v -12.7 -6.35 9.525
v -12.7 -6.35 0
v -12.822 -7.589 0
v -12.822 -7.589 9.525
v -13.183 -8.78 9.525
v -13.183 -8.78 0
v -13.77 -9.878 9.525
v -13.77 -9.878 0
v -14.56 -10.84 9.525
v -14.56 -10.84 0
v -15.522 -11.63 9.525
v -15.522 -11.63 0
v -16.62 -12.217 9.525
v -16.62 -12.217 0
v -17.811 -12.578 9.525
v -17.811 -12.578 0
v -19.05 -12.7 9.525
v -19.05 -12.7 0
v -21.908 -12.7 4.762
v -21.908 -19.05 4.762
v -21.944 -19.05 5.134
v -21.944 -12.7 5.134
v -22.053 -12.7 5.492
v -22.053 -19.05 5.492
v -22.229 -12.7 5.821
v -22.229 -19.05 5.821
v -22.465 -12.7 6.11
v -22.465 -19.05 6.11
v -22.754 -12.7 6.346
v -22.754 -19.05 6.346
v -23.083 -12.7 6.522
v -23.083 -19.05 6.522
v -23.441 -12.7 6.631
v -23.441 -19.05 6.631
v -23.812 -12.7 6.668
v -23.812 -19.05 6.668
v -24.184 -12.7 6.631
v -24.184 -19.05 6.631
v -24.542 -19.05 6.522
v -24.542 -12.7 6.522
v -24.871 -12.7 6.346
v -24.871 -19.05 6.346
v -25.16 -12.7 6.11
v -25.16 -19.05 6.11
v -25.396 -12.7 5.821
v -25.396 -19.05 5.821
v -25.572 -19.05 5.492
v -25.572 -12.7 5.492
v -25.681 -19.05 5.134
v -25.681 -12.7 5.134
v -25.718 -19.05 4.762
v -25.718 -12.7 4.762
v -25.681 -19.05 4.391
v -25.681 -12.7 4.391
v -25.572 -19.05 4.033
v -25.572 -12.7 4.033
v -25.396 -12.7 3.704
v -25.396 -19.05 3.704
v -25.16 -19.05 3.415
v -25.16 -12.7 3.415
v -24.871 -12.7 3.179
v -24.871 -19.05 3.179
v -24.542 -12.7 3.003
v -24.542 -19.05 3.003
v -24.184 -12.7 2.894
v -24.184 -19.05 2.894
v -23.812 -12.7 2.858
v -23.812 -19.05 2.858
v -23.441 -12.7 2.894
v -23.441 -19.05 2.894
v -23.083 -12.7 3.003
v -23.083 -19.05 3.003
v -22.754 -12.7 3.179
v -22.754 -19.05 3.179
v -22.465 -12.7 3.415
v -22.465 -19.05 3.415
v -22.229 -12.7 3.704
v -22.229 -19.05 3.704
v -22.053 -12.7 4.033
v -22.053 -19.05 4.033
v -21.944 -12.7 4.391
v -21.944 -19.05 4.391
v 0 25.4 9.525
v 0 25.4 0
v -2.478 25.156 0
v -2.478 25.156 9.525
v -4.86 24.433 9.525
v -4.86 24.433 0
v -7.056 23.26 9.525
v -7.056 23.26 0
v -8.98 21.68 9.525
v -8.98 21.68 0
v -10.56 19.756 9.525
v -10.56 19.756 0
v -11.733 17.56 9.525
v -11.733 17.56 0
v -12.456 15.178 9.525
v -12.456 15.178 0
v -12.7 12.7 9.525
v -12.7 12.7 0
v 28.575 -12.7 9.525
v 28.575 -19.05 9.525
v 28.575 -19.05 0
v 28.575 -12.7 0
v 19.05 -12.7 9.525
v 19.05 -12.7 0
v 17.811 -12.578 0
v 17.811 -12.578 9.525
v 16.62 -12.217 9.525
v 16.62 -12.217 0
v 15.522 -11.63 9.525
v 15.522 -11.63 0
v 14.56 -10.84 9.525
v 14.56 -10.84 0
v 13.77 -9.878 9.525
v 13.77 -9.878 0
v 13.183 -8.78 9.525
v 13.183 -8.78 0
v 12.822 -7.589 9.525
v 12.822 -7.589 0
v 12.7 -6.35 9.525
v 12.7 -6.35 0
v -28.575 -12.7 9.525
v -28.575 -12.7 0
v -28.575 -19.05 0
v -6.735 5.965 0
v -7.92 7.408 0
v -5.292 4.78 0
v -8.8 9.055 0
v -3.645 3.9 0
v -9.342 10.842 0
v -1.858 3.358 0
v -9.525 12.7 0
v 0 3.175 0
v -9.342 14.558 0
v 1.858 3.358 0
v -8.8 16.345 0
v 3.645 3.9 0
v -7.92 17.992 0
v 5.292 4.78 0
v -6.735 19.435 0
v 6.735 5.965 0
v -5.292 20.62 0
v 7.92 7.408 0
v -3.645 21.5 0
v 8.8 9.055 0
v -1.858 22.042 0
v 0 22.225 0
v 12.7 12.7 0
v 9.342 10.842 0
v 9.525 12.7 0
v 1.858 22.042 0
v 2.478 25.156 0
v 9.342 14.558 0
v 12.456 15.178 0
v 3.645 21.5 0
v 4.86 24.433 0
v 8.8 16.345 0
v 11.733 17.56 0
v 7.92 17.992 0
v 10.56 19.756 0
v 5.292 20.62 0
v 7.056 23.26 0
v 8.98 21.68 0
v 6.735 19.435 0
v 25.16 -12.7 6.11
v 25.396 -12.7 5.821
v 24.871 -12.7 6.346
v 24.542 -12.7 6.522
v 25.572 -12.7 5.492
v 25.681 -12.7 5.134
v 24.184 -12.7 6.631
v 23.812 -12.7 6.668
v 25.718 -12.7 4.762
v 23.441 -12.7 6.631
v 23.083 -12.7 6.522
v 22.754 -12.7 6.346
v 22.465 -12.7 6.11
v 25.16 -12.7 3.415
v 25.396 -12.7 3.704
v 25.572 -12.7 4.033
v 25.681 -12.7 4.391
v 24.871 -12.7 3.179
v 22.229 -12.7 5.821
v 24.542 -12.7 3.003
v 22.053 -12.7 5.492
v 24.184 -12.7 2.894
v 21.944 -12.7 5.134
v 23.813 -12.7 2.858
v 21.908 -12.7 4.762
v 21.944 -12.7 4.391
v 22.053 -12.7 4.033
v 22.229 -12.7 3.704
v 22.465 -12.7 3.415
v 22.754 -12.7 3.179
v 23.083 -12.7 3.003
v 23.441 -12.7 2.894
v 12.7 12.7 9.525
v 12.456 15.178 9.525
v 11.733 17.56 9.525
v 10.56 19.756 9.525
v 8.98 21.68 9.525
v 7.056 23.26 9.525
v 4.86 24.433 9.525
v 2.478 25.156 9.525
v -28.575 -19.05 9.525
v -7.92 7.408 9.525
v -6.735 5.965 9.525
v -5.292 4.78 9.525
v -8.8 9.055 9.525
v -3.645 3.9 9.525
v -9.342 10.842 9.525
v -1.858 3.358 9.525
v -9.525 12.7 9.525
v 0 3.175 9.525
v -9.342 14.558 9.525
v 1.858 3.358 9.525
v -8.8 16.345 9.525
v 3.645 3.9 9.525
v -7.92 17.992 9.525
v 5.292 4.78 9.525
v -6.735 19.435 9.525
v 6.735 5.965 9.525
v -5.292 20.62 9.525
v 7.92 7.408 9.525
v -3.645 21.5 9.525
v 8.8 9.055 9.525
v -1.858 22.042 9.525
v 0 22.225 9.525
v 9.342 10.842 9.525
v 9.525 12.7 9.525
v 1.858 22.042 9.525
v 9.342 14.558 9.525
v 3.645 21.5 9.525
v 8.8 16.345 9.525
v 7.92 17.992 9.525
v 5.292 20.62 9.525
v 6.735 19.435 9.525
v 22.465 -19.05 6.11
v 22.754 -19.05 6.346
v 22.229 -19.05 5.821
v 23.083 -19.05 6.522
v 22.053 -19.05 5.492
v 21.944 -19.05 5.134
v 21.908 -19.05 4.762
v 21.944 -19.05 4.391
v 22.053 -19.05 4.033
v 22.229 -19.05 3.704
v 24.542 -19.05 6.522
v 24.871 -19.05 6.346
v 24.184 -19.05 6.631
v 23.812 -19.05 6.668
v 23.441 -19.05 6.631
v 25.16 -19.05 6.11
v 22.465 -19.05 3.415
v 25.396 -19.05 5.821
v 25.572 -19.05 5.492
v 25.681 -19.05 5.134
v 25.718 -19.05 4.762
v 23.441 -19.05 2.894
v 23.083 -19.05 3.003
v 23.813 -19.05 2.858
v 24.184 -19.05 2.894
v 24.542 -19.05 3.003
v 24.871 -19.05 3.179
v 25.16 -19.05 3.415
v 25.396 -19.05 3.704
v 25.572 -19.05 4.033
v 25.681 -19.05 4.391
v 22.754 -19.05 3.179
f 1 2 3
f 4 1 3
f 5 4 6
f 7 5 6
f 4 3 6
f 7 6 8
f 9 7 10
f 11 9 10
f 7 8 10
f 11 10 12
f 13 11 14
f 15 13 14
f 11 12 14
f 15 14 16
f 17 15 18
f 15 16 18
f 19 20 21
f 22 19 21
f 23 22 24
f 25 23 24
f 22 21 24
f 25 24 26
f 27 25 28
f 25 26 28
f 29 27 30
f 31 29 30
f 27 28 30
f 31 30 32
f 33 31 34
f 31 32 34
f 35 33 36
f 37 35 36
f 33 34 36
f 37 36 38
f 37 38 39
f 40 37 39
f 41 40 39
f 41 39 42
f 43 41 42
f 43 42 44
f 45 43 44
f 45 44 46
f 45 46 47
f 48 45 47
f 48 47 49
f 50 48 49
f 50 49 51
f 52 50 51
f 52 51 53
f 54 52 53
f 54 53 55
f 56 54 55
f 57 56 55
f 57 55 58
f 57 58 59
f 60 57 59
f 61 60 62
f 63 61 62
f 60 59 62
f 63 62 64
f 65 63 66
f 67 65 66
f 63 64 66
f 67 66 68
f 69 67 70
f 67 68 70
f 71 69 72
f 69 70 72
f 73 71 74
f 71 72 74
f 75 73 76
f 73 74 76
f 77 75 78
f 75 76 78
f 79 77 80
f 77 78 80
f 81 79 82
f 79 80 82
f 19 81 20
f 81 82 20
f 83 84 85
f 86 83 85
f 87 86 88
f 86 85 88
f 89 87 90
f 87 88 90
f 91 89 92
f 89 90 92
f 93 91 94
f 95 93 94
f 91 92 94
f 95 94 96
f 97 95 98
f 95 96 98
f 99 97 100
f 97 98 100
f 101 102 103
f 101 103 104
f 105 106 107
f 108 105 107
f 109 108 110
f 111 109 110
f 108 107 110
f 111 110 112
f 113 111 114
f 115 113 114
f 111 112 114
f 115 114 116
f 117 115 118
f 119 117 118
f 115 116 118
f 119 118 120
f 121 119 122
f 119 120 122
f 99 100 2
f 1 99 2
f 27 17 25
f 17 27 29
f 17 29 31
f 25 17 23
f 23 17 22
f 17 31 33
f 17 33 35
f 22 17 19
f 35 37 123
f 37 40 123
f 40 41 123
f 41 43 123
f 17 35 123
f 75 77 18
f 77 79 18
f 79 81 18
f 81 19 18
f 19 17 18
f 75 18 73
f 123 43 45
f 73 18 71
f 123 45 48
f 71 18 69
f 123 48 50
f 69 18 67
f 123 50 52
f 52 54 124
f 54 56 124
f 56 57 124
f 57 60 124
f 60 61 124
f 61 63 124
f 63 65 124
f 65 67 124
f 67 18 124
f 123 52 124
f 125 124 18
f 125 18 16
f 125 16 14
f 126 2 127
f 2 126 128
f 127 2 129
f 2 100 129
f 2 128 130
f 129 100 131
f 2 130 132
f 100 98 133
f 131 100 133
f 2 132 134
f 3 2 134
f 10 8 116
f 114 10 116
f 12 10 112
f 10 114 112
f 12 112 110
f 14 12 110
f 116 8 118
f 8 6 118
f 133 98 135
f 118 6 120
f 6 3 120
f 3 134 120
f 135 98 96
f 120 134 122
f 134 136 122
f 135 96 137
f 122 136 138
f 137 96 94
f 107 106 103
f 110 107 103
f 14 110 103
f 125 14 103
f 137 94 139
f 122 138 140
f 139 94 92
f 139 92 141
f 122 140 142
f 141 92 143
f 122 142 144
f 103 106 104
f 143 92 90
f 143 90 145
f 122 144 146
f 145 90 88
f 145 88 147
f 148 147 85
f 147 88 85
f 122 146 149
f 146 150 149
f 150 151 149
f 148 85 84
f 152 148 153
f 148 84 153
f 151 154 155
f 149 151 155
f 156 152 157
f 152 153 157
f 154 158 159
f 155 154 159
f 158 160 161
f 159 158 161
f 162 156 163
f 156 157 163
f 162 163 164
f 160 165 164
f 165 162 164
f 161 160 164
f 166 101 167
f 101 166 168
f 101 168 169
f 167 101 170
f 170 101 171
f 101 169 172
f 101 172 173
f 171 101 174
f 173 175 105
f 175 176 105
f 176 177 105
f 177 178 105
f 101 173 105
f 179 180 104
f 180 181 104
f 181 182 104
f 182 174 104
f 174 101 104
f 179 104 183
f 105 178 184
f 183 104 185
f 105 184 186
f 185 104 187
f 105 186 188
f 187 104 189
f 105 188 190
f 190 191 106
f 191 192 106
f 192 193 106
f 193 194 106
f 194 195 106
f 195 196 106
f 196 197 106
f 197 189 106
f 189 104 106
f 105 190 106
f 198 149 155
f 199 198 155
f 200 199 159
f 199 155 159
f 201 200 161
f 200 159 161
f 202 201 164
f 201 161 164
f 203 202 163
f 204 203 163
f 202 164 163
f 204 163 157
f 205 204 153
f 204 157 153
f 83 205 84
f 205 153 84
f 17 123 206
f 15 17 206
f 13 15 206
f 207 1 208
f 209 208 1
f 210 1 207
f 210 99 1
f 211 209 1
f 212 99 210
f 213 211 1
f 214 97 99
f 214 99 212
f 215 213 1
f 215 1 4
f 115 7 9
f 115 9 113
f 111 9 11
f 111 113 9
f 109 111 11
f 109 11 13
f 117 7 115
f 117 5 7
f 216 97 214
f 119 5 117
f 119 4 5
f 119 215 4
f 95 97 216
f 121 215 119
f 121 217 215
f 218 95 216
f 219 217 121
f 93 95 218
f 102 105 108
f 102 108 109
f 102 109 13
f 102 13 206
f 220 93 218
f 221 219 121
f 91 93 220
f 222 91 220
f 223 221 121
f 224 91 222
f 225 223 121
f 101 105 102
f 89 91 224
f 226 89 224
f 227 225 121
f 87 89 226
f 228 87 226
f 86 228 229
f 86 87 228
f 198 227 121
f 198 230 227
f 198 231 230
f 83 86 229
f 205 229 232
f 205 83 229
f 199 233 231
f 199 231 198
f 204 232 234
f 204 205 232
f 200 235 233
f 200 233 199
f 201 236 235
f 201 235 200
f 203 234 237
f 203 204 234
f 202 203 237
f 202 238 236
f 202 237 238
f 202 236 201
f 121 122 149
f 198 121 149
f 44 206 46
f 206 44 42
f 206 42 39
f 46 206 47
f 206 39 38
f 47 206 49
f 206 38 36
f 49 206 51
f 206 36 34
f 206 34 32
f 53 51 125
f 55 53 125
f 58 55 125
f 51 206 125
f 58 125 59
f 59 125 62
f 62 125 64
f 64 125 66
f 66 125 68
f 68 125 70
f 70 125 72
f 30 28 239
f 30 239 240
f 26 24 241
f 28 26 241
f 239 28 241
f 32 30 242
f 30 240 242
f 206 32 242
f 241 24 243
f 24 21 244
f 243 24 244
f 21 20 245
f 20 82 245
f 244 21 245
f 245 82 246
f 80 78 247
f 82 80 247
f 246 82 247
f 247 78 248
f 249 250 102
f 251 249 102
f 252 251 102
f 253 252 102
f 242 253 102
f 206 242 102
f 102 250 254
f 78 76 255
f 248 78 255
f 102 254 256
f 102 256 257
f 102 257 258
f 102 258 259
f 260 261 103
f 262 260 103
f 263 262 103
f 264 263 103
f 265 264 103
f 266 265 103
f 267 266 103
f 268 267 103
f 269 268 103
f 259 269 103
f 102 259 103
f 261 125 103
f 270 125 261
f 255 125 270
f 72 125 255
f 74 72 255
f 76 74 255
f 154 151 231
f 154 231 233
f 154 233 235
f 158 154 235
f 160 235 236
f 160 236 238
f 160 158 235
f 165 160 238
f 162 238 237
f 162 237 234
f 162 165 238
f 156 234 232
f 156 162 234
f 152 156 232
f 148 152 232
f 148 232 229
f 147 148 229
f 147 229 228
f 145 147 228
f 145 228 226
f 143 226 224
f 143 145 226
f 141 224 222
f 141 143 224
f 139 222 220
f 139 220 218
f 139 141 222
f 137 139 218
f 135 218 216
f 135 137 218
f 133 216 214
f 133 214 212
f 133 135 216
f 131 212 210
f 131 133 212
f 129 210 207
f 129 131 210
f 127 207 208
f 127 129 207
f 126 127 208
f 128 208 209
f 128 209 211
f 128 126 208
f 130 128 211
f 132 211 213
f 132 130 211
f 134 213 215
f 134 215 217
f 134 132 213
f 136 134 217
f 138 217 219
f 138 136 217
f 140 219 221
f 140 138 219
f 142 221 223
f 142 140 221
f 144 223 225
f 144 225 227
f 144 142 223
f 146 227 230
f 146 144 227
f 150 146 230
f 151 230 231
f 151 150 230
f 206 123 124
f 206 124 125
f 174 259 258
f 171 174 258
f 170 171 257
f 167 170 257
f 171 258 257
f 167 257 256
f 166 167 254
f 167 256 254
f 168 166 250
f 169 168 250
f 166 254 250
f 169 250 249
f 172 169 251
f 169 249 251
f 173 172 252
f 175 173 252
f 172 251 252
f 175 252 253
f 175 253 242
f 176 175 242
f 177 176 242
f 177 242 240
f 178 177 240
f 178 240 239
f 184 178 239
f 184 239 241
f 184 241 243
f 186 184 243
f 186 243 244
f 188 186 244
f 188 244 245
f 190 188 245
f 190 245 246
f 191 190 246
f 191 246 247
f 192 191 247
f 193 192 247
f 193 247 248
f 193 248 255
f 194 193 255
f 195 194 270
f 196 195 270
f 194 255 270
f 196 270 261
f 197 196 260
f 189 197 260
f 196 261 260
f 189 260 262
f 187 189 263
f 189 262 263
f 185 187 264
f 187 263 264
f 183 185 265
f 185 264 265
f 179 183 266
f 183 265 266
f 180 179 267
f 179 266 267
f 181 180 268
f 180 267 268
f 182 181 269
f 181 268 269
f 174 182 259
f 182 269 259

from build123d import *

# Parameters (mm, degrees)
F0_R     = 9.525
F1_DEPTH = 9.525
F2_R     = 1.905
F3_DEPTH = 25.4


with BuildPart() as f1:
    # F0 (on Top) → F1 (new body)
    with BuildSketch(Plane.XY):
        with BuildLine():
            Line((-28.575, -12.7), (-28.575, -19.05))
            Line((-28.575, -19.05), (0, -19.05))
            Line((0, -19.05), (28.575, -19.05))
            Line((28.575, -19.05), (28.575, -12.7))
            Line((28.575, -12.7), (19.05, -12.7))
            ThreePointArc((19.05, -12.7), (14.559872, -10.840128), (12.7, -6.35))
            Line((12.7, -6.35), (12.7, 12.7))
            ThreePointArc((12.7, 12.7), (8.980256, 21.680256), (0, 25.4))
            ThreePointArc((0, 25.4), (-8.980256, 21.680256), (-12.7, 12.7))
            Line((-12.7, 12.7), (-12.7, -6.35))
            ThreePointArc((-12.7, -6.35), (-14.559872, -10.840128), (-19.05, -12.7))
            Line((-19.05, -12.7), (-28.575, -12.7))
        make_face()
        with Locations((0, 12.7)):
            Circle(F0_R, mode=Mode.SUBTRACT)
    extrude(amount=F1_DEPTH)

    # F2 (on face) → F3 (cut)
    with BuildSketch(Plane.XZ.offset(19.05)):
        with Locations((-23.8125, 4.7625)):
            Circle(F2_R)
        with Locations((23.8125, 4.7625)):
            Circle(F2_R)
    extrude(amount=-F3_DEPTH, mode=Mode.SUBTRACT)


solid = f1.part
